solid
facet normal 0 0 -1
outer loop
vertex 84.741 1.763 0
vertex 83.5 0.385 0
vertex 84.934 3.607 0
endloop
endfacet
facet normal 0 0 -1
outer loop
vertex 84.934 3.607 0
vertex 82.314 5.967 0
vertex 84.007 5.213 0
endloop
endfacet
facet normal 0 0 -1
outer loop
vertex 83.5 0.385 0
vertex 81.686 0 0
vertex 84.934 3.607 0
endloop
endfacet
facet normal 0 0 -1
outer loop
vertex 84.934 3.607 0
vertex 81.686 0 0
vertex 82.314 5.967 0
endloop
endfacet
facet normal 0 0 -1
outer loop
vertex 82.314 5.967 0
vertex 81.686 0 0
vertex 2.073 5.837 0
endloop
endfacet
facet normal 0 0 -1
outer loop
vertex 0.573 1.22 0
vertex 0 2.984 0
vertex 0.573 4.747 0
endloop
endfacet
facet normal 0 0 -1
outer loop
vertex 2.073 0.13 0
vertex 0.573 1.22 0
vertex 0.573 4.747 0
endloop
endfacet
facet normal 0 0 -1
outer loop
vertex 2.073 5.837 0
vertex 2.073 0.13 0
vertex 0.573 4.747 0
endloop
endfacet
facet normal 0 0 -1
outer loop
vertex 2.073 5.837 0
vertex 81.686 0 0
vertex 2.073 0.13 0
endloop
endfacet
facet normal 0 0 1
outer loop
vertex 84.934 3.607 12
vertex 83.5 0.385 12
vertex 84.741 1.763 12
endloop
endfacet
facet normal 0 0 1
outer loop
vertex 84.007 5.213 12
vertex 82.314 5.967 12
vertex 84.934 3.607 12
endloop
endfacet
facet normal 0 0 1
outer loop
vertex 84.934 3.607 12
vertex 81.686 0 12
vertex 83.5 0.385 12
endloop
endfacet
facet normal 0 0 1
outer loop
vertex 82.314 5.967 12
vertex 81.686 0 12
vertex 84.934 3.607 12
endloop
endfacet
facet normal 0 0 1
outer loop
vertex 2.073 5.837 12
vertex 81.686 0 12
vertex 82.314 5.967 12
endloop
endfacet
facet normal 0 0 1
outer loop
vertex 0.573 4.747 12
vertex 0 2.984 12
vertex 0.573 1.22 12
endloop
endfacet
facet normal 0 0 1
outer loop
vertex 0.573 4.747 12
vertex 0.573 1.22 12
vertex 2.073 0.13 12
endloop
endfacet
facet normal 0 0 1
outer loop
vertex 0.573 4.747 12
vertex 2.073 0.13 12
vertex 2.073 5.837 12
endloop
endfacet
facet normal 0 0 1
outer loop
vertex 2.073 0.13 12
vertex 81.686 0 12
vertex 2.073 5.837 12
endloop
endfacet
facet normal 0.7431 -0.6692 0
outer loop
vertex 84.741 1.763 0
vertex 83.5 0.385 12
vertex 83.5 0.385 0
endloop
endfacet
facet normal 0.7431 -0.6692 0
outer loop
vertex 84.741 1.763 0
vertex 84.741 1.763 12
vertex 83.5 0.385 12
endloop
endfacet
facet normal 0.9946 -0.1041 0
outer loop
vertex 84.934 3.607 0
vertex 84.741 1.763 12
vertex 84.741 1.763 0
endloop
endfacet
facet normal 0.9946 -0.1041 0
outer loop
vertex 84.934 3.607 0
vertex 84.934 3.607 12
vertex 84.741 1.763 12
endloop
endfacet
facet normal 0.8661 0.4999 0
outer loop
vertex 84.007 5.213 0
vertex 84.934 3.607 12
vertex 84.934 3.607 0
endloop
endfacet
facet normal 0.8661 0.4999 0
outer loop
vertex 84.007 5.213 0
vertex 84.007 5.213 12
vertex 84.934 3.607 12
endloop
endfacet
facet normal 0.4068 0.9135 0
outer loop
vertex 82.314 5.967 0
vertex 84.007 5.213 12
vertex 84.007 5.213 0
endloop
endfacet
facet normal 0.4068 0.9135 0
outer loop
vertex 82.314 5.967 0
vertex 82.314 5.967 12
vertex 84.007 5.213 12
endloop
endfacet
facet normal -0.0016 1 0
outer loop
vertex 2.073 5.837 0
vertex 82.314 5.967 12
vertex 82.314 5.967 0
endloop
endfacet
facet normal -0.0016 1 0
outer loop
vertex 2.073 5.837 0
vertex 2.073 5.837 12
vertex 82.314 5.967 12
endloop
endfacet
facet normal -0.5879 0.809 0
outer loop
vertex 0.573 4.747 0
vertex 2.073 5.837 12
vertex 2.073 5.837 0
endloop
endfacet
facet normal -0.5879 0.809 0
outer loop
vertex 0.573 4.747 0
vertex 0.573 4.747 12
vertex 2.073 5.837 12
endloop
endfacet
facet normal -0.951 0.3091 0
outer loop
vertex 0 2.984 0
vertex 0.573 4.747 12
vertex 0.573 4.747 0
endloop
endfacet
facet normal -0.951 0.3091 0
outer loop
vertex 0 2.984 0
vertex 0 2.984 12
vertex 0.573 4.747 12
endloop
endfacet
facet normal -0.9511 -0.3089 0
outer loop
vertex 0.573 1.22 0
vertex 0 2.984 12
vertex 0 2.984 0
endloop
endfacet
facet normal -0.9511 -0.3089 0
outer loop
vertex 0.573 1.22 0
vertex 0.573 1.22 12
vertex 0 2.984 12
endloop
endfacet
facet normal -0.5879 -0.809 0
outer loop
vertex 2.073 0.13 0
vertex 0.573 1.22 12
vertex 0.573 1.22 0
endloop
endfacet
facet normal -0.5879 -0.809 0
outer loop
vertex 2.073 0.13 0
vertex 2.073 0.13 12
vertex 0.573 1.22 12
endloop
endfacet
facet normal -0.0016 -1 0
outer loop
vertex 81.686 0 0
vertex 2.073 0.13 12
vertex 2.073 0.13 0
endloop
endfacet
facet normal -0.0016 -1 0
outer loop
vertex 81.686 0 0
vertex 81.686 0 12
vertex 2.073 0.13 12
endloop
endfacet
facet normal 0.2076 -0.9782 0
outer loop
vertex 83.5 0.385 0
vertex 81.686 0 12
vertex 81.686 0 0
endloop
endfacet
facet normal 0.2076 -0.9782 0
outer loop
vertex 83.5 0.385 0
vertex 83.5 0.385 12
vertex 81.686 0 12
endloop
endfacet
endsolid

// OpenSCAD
$fn = 32;

// ----------------------------------------------------------------------
// Key bar: parallel key, 12 mm thick
// ----------------------------------------------------------------------

// --- parameters (mm) ---
profile_height = 12;      // extrusion height
profile_points = 11;      // points of the closed outline

profile = [[0, 2.984], [0.573, 1.22], [2.073, 0.13], [81.686, 0], [83.5, 0.385], [84.741, 1.763], [84.934, 3.607], [84.007, 5.213], [82.314, 5.967], [2.073, 5.837], [0.573, 4.747]];  // single closed polygon, 11 points, counter clockwise

// --- the one profile operation ---
linear_extrude(height = profile_height) polygon(points = profile);
